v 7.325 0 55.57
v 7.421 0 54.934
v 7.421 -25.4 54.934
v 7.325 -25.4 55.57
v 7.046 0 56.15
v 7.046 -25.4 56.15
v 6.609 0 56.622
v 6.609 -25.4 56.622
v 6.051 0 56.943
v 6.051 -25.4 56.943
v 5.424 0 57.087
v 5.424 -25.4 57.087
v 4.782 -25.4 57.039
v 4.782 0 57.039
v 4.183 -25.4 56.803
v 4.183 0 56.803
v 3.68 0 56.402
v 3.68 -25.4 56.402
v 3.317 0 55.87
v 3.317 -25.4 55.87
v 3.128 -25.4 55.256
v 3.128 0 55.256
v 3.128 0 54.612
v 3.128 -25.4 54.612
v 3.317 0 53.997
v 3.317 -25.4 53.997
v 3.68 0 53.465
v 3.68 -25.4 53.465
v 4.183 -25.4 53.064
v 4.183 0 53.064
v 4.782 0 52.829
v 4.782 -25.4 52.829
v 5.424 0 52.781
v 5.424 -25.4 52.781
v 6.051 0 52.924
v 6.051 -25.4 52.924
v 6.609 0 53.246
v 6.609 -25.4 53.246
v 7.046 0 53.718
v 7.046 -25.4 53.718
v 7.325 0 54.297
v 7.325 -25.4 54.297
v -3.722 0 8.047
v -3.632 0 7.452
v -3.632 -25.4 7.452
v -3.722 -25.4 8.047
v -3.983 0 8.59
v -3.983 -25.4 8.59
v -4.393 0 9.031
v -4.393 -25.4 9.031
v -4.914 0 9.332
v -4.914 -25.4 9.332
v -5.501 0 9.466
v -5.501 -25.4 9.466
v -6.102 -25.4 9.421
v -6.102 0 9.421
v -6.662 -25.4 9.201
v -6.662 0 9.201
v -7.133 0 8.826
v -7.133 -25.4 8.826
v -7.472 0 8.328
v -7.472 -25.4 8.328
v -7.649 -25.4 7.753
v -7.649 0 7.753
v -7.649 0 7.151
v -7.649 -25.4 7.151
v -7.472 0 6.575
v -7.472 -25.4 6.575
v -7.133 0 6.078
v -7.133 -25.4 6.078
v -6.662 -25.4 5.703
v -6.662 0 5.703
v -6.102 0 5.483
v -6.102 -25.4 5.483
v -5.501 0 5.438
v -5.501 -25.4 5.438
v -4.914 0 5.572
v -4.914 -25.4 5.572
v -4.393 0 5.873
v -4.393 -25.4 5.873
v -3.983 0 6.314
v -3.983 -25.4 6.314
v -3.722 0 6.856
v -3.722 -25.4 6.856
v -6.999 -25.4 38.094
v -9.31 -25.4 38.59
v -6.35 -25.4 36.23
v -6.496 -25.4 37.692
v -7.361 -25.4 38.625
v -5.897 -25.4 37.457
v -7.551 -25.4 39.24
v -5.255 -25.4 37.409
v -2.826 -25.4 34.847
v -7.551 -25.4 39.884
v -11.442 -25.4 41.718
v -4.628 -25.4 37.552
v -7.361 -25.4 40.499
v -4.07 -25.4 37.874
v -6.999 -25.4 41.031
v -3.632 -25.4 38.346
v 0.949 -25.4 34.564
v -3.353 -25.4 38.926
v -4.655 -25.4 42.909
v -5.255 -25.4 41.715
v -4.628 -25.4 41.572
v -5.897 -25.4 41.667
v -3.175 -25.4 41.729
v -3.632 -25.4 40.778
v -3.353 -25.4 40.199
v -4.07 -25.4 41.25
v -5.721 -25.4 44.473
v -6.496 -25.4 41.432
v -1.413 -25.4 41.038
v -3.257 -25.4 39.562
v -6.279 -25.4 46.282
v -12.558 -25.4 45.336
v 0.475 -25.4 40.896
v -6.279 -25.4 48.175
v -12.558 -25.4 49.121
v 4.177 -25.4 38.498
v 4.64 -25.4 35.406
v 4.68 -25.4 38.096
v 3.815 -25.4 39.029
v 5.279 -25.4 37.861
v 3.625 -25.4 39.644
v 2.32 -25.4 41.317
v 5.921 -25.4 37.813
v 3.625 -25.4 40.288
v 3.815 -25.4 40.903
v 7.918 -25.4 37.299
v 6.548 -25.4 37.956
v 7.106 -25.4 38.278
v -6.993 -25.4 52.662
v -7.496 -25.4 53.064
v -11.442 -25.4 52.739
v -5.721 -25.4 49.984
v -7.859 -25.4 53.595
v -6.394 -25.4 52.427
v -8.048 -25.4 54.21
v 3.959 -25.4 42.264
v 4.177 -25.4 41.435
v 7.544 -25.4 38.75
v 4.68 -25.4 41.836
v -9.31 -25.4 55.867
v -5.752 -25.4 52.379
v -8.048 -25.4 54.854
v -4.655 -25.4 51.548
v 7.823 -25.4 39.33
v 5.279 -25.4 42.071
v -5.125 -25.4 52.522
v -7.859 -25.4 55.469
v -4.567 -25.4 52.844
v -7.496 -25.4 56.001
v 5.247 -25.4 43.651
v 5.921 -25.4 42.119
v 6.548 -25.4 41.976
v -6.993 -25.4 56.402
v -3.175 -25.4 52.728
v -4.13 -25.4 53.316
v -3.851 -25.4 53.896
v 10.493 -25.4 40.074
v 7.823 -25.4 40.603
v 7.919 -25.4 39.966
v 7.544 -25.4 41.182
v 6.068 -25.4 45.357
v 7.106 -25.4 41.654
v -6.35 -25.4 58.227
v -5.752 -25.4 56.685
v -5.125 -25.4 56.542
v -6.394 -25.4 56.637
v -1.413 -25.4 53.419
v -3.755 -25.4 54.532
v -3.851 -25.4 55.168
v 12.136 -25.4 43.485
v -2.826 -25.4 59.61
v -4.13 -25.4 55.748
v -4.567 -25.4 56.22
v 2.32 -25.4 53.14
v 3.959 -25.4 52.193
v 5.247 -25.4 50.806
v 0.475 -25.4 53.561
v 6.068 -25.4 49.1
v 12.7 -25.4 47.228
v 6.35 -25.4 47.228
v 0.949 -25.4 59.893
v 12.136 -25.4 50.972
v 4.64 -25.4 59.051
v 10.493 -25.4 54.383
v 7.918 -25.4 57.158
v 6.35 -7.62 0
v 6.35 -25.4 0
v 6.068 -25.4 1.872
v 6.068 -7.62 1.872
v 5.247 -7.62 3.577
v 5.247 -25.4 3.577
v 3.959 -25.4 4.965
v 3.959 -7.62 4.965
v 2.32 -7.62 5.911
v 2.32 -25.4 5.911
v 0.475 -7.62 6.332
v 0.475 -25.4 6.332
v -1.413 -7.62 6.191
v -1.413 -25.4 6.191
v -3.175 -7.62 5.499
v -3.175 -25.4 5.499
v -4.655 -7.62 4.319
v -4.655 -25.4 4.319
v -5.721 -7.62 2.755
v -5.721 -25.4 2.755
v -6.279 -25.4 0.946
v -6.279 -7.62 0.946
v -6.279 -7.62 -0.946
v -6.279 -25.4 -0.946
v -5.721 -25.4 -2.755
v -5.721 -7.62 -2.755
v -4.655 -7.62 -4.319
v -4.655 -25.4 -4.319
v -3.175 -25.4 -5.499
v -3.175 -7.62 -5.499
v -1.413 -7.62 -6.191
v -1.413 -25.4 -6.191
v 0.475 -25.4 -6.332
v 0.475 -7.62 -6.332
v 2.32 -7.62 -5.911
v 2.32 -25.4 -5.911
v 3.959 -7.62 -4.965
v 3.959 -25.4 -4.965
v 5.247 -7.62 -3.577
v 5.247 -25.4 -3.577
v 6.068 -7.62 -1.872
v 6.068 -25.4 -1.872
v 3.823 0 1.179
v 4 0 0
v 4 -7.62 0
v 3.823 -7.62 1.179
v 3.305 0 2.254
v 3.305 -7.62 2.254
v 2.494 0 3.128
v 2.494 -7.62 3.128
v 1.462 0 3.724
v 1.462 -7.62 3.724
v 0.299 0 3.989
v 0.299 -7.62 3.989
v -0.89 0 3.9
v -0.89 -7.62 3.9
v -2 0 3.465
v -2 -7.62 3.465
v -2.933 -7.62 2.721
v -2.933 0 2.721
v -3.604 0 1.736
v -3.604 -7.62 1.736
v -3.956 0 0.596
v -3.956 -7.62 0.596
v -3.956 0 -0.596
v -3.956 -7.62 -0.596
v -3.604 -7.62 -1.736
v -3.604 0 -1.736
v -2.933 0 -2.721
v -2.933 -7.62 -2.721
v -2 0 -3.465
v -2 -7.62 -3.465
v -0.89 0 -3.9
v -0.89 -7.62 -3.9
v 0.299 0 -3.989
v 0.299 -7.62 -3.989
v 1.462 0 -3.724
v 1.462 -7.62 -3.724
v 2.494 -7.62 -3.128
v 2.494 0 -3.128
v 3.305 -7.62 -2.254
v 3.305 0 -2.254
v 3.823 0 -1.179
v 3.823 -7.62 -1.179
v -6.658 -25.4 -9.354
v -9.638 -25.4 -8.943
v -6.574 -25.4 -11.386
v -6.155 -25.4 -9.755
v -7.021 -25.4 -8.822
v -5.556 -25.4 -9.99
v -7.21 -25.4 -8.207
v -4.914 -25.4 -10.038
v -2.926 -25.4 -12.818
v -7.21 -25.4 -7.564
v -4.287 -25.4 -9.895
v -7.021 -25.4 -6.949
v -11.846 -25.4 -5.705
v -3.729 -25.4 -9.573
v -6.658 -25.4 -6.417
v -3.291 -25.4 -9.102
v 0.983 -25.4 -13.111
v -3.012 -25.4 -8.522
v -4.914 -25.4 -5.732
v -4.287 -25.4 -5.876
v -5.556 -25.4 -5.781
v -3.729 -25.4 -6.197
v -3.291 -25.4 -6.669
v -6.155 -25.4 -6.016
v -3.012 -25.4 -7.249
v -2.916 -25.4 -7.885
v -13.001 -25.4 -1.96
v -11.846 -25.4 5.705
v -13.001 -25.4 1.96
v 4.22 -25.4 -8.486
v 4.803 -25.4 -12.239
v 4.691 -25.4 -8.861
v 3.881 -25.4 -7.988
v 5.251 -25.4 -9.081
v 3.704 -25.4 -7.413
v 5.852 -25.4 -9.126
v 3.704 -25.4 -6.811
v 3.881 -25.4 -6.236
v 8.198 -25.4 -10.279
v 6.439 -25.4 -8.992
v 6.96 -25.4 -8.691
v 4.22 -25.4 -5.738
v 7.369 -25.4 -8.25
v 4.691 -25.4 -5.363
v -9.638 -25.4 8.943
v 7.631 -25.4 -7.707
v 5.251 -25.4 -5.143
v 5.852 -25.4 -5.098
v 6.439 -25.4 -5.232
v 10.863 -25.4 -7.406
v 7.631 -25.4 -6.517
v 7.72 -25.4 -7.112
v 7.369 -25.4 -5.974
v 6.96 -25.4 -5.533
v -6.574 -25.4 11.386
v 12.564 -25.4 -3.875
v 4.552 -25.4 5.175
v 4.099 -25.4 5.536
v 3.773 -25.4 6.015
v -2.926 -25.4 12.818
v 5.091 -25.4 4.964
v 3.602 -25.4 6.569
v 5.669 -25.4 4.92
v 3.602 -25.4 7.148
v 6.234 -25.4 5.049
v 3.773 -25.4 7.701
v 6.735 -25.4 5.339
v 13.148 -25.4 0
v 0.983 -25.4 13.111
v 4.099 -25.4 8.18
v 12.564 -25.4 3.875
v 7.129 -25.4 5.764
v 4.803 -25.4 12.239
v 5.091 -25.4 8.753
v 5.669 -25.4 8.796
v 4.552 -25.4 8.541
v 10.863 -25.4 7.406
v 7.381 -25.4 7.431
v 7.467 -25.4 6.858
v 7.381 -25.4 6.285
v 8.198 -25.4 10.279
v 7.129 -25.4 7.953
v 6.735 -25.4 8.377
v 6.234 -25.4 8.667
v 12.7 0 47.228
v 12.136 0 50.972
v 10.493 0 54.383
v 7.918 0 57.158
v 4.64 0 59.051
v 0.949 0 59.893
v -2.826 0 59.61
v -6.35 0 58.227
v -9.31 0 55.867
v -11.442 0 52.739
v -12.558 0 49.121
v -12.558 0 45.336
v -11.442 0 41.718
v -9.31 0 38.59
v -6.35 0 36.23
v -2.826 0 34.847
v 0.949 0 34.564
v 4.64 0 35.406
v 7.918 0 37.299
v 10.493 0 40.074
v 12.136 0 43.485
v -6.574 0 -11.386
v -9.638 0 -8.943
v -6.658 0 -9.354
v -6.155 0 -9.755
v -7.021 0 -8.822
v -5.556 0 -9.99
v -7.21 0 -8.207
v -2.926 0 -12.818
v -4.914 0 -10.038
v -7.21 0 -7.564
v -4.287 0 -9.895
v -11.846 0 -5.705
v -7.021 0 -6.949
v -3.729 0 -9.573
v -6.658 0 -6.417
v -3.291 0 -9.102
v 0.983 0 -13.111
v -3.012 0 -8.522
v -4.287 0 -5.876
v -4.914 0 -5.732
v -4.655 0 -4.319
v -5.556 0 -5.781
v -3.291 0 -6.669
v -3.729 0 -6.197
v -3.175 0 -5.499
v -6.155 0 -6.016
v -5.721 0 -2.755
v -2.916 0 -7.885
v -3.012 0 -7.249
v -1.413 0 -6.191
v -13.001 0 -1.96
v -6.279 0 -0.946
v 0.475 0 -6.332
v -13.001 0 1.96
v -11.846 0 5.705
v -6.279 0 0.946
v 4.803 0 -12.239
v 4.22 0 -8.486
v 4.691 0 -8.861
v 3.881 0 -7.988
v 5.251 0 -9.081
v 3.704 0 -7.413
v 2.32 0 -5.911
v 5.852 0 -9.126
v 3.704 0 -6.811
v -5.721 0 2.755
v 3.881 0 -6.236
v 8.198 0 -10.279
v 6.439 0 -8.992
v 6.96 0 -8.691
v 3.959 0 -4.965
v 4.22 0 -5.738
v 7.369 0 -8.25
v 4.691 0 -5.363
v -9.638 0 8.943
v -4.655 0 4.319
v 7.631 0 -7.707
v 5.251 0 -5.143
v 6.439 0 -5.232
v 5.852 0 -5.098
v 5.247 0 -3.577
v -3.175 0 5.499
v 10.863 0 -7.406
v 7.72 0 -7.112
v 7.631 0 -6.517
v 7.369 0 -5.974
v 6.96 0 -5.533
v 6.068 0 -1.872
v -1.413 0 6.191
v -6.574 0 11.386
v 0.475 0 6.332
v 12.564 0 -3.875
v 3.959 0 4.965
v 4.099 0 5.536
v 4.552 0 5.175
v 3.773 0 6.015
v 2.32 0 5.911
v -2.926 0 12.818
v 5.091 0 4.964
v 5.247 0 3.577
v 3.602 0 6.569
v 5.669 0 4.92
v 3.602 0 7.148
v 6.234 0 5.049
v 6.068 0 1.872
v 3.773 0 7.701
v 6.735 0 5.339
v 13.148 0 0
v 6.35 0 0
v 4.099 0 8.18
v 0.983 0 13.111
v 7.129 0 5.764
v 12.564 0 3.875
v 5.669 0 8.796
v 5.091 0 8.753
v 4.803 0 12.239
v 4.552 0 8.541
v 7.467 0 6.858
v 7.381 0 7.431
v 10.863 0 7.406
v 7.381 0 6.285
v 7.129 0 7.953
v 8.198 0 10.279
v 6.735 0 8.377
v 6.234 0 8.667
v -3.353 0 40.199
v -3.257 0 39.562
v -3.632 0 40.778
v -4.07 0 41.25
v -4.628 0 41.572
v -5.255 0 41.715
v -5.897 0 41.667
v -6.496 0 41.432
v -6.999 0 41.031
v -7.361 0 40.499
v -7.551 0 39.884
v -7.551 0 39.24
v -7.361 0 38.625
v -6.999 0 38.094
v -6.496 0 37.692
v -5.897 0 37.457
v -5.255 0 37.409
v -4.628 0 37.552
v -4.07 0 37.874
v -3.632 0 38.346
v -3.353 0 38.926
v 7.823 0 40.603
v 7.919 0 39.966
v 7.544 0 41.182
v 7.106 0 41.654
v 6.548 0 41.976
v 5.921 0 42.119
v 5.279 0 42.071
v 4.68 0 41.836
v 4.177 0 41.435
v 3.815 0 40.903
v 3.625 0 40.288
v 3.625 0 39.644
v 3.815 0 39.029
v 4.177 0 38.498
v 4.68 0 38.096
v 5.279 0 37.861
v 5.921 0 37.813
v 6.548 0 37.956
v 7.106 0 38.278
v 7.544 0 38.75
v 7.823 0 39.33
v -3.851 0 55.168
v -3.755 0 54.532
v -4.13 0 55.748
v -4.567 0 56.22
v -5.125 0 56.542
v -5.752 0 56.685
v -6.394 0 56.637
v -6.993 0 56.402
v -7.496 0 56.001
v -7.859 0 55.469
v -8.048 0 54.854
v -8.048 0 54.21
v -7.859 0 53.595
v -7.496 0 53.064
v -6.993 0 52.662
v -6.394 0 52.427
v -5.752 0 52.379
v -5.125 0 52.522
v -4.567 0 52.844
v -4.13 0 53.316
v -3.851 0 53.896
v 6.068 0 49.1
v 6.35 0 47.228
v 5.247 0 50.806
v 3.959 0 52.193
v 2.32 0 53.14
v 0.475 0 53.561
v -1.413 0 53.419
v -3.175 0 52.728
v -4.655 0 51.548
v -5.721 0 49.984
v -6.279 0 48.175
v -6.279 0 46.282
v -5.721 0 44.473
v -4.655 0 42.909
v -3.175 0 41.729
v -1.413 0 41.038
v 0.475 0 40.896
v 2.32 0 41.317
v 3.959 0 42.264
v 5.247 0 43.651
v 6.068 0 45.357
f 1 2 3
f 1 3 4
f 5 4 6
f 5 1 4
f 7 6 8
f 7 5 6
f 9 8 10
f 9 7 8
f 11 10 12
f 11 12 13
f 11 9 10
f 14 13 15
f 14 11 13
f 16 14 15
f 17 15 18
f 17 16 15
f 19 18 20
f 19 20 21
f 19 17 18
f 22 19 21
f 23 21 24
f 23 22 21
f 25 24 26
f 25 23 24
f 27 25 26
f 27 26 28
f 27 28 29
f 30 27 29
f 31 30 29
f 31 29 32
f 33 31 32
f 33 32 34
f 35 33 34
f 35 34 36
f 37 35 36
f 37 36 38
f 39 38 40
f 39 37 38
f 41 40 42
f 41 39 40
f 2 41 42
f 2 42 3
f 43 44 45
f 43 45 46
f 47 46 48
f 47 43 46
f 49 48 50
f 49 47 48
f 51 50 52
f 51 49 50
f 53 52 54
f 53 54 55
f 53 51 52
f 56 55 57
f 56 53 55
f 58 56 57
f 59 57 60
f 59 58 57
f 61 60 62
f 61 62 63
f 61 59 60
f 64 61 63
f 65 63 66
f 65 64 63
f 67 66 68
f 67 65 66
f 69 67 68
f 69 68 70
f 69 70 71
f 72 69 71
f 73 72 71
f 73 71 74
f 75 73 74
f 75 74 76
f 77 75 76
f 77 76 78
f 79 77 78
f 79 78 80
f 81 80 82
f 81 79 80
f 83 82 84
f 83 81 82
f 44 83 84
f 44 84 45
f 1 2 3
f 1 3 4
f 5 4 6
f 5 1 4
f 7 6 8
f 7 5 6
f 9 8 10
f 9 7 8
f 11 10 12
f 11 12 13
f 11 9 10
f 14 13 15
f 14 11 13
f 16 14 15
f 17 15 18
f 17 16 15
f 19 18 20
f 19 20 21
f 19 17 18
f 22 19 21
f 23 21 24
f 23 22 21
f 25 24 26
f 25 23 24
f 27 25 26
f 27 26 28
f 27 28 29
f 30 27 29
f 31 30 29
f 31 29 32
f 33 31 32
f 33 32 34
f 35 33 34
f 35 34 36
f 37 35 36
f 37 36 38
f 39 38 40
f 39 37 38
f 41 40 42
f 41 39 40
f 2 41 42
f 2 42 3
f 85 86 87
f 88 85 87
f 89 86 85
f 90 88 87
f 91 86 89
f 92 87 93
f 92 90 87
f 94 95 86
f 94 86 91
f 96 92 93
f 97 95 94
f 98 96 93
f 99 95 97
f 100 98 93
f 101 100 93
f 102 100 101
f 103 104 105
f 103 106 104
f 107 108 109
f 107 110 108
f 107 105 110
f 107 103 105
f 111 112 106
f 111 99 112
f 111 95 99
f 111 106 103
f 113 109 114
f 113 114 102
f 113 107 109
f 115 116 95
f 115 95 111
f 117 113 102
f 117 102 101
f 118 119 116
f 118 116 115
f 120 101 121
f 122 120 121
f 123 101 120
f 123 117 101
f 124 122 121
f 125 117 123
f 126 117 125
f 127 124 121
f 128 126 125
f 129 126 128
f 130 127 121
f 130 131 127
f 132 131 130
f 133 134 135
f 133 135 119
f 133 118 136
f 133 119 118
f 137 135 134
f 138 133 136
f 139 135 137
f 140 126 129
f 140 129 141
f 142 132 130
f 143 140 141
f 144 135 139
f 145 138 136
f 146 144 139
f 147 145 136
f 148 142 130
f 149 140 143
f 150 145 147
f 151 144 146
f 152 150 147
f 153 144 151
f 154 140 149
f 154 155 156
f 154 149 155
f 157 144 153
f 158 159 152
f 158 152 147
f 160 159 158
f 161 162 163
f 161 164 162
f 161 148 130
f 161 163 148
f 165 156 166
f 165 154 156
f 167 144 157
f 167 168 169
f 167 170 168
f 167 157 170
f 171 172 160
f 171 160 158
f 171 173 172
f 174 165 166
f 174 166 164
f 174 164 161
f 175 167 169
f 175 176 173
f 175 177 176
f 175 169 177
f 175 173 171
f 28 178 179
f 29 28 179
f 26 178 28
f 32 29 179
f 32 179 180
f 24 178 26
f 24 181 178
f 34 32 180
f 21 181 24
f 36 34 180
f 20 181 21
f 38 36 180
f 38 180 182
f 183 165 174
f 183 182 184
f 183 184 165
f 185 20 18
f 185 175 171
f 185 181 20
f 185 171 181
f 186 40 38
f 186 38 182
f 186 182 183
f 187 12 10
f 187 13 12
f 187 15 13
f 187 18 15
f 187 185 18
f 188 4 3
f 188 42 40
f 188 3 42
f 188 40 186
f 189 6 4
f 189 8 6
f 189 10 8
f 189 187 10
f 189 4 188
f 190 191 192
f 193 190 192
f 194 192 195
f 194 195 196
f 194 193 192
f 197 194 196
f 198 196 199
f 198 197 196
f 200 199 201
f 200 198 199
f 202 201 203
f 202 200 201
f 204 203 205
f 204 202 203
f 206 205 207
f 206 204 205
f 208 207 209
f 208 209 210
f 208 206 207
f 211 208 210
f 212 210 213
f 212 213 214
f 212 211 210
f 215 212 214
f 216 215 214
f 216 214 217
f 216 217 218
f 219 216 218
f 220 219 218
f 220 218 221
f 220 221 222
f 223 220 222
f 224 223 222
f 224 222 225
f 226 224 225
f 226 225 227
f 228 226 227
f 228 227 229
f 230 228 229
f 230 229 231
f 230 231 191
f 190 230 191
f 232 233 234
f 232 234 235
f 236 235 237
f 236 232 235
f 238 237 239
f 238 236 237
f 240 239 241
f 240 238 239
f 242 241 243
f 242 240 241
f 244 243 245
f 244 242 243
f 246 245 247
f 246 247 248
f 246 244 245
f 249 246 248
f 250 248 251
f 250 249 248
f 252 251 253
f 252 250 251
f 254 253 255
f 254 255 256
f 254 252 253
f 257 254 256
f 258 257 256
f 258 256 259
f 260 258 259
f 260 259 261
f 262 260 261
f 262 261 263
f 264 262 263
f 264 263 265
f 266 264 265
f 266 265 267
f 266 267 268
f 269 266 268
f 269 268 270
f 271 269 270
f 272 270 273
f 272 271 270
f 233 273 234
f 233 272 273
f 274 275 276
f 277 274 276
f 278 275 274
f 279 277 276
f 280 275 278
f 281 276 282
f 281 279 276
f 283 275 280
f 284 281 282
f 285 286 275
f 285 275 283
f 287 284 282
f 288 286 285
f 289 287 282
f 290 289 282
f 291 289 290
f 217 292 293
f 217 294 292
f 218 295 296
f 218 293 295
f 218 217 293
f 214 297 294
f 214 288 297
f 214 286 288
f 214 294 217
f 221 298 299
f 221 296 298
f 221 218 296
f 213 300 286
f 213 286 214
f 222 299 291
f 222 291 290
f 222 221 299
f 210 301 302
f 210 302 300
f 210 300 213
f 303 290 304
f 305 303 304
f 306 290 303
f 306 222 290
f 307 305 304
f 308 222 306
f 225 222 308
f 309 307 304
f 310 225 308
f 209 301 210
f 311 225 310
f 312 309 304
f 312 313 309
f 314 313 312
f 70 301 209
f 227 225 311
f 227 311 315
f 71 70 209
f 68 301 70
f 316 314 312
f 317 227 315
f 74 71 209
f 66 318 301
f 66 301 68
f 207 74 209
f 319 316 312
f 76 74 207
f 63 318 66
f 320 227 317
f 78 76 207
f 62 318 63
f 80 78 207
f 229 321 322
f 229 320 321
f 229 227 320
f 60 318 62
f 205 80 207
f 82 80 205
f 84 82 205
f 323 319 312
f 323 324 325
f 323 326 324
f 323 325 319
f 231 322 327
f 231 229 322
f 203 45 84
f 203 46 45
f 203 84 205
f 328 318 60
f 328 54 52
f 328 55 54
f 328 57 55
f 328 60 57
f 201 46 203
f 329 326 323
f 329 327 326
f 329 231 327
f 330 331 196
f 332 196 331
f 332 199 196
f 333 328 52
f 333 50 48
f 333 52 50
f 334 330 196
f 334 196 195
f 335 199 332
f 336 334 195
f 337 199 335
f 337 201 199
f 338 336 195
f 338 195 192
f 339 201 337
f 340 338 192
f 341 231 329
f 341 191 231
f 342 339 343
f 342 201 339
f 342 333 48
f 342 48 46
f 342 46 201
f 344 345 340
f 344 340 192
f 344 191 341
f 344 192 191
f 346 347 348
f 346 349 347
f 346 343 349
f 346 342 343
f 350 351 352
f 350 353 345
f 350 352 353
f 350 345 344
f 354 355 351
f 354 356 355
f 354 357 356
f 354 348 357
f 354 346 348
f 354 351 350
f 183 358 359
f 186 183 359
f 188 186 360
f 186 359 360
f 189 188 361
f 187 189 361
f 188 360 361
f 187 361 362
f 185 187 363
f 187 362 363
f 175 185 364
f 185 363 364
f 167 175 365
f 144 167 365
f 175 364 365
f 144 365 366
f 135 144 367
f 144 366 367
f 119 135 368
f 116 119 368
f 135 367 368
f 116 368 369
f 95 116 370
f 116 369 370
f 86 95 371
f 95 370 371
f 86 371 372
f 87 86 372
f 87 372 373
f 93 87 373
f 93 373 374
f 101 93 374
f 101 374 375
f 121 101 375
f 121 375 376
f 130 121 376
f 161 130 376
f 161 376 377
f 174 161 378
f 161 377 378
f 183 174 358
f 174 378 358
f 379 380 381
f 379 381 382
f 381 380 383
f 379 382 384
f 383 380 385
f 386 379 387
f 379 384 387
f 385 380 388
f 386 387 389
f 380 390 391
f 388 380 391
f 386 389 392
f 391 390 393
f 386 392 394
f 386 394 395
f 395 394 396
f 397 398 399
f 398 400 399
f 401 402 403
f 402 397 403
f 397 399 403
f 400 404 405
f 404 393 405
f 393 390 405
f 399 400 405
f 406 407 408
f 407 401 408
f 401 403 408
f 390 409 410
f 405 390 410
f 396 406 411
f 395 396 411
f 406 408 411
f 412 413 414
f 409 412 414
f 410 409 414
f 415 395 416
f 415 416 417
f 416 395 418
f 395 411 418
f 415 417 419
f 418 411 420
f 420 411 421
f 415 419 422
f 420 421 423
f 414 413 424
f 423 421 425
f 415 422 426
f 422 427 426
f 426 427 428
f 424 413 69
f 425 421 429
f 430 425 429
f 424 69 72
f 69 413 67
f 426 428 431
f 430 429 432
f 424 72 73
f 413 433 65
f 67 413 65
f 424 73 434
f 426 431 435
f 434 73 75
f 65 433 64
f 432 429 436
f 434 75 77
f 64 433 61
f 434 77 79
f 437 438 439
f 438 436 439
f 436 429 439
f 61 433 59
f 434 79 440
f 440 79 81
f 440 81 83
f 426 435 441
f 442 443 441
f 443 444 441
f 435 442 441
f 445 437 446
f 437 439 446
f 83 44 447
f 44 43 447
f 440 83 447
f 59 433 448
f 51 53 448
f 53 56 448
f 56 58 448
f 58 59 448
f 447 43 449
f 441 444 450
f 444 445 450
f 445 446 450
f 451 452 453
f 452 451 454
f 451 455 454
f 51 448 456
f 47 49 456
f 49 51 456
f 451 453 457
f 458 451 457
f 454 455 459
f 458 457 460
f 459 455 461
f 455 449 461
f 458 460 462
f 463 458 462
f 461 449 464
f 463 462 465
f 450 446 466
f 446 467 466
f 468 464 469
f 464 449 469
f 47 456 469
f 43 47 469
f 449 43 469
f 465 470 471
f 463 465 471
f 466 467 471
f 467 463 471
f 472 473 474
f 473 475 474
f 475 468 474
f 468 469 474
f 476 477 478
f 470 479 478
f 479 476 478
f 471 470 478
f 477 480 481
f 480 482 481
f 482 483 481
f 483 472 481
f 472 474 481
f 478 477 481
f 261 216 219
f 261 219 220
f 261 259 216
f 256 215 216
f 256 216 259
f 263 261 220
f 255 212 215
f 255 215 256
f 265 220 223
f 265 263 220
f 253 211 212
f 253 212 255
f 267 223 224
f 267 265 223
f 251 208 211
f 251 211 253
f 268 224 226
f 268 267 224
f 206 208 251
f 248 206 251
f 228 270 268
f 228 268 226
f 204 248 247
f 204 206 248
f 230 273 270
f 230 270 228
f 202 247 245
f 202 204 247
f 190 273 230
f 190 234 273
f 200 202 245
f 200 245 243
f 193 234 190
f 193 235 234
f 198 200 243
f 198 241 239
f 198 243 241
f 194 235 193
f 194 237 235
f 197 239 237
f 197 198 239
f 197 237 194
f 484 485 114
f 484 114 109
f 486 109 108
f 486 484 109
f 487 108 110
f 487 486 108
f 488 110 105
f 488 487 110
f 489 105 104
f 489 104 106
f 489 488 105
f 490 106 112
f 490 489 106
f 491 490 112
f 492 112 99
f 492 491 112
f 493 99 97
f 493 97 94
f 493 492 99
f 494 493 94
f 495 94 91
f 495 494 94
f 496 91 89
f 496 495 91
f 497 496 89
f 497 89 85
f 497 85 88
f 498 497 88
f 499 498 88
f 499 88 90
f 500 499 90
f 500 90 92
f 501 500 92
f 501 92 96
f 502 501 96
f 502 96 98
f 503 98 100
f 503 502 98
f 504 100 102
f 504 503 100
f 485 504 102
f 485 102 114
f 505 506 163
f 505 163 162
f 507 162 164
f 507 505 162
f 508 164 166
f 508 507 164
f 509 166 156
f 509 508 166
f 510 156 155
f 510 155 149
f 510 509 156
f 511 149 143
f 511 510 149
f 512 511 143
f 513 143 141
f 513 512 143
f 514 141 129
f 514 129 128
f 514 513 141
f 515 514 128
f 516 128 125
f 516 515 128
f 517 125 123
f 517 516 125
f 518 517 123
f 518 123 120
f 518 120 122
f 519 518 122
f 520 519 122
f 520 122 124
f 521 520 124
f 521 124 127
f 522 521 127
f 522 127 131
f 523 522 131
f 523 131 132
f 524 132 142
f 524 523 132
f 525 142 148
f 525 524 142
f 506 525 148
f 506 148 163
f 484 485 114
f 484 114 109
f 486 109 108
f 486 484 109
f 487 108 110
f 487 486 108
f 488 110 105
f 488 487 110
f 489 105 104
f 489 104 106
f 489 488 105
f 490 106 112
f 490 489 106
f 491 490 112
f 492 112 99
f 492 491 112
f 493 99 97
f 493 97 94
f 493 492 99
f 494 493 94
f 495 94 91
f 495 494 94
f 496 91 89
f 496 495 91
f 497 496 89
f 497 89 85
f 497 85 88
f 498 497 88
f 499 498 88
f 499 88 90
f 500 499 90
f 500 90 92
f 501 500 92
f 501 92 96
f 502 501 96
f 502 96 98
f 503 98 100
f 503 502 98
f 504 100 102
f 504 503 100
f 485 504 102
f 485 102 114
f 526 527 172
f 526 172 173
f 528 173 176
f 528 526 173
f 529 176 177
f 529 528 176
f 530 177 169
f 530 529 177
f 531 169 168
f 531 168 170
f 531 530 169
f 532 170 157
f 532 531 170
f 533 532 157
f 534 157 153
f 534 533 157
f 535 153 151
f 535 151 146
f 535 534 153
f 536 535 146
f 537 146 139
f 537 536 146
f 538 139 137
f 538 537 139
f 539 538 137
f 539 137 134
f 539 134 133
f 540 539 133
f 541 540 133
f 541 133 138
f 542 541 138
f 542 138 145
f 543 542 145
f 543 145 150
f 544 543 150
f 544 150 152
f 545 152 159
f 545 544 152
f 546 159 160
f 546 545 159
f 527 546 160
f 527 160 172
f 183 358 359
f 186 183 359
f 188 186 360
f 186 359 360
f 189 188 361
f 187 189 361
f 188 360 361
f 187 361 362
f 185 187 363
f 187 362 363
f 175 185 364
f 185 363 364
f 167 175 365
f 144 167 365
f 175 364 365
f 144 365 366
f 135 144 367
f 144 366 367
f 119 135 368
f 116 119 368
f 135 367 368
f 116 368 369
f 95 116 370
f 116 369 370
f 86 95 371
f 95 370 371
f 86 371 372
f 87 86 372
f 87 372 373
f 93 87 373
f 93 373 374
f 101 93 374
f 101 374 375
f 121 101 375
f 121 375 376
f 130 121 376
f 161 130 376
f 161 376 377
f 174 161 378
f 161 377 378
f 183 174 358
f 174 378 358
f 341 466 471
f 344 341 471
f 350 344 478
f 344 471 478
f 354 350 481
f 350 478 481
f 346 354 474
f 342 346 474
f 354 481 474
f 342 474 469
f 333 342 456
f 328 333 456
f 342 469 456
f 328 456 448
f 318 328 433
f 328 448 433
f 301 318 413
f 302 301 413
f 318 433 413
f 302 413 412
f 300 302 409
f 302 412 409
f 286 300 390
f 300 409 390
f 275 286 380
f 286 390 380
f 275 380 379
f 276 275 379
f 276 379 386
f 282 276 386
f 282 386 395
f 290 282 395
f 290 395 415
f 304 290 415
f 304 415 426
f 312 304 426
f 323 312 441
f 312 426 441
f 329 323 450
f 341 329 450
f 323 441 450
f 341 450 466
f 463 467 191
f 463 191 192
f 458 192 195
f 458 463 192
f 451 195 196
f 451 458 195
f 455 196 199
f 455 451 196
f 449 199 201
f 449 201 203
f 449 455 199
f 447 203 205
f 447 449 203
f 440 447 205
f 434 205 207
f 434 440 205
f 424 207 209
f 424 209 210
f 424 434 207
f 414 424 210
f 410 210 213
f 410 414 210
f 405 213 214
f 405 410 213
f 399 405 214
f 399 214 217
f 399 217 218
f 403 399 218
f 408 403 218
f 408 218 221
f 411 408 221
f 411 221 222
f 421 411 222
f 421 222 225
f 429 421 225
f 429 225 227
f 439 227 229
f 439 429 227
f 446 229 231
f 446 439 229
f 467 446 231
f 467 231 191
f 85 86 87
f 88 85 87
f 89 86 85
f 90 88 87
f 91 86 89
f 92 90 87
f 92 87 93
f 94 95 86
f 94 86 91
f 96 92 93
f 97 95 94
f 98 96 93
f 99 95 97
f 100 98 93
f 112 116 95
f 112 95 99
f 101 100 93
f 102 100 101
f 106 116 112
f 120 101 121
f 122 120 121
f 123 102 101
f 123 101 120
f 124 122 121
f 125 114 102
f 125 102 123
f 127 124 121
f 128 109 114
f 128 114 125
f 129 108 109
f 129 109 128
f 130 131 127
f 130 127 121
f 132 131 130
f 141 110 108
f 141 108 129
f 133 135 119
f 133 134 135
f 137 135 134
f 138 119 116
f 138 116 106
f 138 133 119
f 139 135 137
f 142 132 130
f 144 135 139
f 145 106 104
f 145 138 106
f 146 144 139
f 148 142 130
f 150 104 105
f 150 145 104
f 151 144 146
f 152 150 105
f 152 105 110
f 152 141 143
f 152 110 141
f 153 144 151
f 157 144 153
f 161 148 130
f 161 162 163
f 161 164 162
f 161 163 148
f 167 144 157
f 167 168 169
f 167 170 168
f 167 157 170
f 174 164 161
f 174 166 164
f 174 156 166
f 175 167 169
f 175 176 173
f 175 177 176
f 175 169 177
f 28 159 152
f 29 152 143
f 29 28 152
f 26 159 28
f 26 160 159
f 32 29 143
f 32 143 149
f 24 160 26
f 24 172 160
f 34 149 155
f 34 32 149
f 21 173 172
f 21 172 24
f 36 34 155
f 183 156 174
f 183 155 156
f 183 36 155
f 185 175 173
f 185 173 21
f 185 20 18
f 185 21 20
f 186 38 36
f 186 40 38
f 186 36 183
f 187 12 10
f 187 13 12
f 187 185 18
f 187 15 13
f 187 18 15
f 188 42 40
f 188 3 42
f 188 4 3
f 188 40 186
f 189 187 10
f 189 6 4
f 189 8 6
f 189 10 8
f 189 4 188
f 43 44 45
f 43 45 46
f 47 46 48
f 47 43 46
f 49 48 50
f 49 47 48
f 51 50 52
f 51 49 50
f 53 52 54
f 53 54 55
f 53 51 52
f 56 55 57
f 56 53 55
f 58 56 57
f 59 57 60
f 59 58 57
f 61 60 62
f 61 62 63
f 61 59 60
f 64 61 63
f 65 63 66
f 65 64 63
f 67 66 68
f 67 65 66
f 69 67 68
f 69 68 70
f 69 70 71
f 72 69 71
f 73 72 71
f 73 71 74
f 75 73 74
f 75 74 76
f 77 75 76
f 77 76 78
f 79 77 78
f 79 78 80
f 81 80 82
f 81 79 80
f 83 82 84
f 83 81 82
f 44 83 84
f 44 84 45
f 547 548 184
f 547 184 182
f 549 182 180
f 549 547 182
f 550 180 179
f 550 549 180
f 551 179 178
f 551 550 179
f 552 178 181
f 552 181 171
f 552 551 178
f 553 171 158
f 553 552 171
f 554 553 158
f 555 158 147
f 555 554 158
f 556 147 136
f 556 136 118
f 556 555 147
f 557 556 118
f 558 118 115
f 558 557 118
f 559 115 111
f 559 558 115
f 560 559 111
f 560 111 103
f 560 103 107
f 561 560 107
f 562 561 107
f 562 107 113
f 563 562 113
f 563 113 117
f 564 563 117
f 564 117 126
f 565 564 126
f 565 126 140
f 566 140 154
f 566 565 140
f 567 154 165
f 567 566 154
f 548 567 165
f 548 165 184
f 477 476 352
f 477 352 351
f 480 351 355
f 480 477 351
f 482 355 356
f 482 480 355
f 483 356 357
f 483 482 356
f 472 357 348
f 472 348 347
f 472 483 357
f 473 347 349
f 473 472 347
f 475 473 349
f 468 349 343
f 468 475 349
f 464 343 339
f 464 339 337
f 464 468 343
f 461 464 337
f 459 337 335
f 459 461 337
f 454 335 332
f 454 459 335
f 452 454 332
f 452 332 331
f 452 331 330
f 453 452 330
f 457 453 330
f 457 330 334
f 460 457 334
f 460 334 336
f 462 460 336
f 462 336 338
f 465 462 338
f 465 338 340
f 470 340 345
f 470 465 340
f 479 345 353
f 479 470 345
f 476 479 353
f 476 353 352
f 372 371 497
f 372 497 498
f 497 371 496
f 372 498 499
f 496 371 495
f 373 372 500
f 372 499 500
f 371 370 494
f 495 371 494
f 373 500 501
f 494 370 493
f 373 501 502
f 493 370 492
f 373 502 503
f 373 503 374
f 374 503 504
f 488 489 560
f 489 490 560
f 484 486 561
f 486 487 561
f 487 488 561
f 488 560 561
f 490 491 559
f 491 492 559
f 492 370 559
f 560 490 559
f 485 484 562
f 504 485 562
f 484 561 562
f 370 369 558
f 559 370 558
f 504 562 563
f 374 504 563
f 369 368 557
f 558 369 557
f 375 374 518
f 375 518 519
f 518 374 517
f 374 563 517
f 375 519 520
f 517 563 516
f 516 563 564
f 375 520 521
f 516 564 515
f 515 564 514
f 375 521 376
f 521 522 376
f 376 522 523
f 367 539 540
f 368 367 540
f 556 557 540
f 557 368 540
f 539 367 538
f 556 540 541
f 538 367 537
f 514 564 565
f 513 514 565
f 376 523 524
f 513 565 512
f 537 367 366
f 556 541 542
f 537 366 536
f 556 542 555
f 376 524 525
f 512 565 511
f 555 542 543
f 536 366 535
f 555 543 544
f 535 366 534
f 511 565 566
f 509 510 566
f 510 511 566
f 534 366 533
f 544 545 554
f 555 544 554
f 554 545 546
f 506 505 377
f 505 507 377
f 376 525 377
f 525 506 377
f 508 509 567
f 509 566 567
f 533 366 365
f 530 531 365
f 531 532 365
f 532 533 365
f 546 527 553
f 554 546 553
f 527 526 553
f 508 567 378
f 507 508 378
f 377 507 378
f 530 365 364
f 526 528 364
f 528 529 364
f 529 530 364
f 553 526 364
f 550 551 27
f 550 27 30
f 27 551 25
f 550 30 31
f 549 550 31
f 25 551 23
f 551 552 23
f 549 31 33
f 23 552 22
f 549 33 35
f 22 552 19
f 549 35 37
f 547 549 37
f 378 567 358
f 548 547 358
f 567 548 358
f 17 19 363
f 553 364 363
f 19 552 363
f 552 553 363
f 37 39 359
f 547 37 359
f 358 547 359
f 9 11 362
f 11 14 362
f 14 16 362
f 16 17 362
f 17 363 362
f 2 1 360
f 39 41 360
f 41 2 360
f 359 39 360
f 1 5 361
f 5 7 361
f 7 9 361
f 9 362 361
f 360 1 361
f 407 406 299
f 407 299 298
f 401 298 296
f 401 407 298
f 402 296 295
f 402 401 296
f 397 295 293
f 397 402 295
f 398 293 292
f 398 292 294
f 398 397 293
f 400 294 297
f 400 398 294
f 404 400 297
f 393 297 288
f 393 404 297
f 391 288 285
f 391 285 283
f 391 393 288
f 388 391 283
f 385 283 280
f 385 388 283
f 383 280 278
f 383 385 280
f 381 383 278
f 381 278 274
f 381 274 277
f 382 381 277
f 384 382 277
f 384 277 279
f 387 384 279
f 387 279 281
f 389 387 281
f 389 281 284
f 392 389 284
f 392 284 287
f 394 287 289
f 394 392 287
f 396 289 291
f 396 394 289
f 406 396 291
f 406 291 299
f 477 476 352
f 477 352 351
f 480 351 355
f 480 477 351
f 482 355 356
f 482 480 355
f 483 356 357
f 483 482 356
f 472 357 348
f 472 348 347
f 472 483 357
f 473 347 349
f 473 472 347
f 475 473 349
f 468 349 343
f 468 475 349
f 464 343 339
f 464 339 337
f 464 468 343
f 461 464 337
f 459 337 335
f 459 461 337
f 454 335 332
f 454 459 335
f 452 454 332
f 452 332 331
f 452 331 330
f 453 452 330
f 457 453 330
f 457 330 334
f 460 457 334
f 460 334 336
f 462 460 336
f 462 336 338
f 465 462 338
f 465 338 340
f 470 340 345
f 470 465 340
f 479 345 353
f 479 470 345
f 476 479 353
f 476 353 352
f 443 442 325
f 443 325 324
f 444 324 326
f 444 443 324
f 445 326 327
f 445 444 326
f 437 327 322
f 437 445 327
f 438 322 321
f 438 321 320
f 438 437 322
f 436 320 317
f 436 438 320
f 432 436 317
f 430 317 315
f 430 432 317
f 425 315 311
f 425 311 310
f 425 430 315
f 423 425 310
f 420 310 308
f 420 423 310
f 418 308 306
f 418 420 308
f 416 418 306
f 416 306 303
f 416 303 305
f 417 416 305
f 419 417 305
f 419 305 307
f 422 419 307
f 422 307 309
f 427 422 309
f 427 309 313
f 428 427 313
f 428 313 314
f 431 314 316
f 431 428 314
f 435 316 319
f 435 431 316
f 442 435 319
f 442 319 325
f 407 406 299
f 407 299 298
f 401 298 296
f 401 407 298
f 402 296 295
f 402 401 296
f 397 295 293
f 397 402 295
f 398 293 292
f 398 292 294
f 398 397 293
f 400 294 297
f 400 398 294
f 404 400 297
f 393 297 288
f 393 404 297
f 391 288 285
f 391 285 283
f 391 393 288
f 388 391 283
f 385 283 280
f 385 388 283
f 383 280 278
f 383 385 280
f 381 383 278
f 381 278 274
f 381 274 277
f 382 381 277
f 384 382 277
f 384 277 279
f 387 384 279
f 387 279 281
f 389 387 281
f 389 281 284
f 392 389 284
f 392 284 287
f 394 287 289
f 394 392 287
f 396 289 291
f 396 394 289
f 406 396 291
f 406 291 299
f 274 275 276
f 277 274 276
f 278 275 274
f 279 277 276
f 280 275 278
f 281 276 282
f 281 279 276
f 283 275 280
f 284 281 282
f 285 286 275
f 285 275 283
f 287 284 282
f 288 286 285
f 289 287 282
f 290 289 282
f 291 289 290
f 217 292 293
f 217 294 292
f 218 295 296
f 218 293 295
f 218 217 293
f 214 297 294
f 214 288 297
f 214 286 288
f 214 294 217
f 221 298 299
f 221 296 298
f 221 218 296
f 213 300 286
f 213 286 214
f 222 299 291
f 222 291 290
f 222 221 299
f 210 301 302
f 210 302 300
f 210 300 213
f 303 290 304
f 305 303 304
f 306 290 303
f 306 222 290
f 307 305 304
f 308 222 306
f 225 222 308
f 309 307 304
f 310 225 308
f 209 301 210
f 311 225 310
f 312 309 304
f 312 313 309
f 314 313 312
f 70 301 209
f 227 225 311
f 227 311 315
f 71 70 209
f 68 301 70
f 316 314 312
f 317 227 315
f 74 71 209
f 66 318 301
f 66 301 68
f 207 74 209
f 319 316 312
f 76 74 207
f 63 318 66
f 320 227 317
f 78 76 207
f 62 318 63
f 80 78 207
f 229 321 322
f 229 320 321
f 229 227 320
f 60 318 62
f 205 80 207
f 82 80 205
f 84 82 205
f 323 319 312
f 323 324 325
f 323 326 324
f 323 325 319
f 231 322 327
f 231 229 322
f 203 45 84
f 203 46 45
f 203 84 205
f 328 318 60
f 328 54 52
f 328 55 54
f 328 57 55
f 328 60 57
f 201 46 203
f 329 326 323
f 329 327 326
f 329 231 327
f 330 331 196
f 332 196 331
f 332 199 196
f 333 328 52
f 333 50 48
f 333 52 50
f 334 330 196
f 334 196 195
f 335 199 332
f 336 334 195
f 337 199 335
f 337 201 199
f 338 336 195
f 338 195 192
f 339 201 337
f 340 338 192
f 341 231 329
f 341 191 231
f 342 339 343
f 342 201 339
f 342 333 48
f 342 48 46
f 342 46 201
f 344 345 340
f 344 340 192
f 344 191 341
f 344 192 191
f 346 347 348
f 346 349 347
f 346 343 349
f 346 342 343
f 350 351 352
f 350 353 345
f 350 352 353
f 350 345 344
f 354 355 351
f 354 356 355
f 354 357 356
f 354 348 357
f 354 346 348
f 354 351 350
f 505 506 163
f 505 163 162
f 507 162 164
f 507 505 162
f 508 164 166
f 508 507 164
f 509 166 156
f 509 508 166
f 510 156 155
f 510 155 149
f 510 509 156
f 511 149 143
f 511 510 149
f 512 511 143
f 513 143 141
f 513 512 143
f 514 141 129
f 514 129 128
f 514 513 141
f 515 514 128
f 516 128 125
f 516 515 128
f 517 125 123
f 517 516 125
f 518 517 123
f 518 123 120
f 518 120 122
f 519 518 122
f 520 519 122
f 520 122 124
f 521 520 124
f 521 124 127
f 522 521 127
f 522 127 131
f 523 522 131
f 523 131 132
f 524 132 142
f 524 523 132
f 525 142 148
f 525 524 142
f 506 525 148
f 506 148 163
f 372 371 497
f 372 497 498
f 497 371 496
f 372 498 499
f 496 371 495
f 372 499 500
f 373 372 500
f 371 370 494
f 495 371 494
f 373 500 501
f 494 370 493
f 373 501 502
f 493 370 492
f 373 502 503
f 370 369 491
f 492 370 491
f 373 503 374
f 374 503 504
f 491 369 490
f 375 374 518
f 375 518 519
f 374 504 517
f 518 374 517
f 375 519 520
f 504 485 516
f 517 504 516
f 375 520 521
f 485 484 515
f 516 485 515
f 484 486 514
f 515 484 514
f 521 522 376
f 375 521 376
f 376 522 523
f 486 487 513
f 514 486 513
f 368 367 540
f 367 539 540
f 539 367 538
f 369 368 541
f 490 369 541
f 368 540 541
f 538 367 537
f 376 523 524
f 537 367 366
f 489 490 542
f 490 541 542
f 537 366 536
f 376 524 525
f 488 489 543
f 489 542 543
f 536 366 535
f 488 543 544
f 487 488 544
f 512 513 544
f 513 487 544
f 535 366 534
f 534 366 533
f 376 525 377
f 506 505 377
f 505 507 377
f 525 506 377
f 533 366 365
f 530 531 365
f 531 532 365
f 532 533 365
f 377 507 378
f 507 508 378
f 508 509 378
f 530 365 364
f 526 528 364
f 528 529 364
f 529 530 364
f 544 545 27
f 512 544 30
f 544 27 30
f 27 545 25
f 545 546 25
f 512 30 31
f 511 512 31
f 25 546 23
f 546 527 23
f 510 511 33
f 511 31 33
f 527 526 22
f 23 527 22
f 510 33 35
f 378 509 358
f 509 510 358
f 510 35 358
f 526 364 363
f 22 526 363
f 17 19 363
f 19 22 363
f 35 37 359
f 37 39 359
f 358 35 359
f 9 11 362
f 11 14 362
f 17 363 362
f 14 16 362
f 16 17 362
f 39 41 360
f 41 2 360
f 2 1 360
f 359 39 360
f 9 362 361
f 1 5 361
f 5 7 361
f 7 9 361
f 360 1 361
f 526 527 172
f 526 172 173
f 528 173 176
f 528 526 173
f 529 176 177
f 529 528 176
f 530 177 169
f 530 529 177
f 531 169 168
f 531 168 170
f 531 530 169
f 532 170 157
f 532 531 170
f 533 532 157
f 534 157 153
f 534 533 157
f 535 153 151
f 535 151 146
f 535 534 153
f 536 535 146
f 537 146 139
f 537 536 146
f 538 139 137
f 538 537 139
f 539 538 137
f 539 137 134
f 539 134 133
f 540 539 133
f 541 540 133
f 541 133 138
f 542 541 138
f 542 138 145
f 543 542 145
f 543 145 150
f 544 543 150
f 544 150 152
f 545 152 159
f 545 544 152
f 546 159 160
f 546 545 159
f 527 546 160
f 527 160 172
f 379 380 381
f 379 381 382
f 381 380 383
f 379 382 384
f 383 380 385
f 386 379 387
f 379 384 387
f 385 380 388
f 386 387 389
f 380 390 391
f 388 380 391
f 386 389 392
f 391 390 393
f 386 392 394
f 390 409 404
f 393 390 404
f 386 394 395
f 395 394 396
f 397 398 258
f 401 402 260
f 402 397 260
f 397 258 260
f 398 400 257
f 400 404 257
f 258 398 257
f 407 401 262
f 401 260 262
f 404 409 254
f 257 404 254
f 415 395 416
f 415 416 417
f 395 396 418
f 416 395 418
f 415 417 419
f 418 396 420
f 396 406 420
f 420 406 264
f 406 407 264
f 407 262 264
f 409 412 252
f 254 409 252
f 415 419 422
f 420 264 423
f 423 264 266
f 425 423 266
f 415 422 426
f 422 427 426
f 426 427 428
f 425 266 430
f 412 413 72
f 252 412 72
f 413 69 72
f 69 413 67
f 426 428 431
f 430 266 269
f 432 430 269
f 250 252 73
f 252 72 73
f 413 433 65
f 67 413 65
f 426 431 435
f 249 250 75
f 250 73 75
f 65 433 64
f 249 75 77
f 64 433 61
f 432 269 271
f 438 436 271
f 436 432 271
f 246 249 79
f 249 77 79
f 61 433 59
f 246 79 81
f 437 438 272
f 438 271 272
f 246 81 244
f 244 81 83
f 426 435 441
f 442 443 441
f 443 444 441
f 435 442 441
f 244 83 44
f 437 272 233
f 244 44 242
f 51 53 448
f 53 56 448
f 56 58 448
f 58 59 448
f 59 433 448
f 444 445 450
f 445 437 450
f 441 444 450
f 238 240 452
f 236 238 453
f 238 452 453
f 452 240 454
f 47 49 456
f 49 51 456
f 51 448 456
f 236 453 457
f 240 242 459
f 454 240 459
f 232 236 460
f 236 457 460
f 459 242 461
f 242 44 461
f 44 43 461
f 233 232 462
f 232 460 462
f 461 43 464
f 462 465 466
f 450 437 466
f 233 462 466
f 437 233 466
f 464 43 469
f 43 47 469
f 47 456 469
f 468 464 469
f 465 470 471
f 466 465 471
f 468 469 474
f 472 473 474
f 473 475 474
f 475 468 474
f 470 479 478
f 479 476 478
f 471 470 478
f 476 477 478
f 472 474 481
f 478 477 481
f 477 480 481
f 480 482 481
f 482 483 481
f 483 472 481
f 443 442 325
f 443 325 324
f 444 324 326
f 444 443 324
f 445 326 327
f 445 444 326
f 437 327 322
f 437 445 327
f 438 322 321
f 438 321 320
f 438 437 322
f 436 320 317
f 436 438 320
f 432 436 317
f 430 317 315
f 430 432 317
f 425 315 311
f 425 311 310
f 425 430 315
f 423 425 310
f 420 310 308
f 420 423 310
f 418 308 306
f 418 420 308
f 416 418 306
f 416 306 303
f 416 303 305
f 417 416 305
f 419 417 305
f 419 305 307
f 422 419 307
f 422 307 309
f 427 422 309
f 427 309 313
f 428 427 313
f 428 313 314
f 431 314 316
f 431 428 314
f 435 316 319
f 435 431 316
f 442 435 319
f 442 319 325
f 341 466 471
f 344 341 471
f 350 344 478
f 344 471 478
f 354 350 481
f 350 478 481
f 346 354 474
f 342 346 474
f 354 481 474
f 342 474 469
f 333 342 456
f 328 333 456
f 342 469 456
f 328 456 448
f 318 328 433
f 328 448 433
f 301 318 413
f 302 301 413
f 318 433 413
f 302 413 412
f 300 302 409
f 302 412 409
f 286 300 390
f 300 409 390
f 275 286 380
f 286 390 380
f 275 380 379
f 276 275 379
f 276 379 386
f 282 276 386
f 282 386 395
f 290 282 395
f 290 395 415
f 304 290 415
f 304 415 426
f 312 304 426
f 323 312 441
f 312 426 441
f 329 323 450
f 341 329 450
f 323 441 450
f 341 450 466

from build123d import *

# Parameters (mm, degrees)
F0_R     = 6.35
F0_R_2   = 4.0005
F1_DEPTH = 7.62
F0_R_3   = 13.147852
F0_R_4   = 2.159
F0_R_5   = 2.019739
F0_R_6   = 1.943232
F2_DEPTH = 25.4
F0_R_7   = 12.7
F3_DEPTH = 25.4
F4_DEPTH = 25.4


with BuildPart() as f1:
    # F0 (on Front) → F1 (new body)
    with BuildSketch(Plane.XZ):
        Circle(F0_R)
        Circle(F0_R_2, mode=Mode.SUBTRACT)
    extrude(amount=F1_DEPTH)

    # F0 (on Front) → F2 (join)
    with BuildSketch(Plane.XZ):
        Circle(F0_R_3)
        with Locations((-5.075337, -7.885403)):
            Circle(F0_R_4, mode=Mode.SUBTRACT)
        with Locations((-5.652183, 7.45177)):
            Circle(F0_R_5, mode=Mode.SUBTRACT)
        with Locations((5.700697, -7.111833)):
            Circle(F0_R_5, mode=Mode.SUBTRACT)
        Circle(F0_R, mode=Mode.SUBTRACT)
        with Locations((5.523817, 6.858167)):
            Circle(F0_R_6, mode=Mode.SUBTRACT)
    extrude(amount=F2_DEPTH)

    # F0 (on Front) → F3 (join)
    with BuildSketch(Plane.XZ):
        Circle(F0_R_3)
        with Locations((-5.075337, -7.885403)):
            Circle(F0_R_4, mode=Mode.SUBTRACT)
        with Locations((-5.652183, 7.45177)):
            Circle(F0_R_5, mode=Mode.SUBTRACT)
        with Locations((5.700697, -7.111833)):
            Circle(F0_R_5, mode=Mode.SUBTRACT)
        Circle(F0_R, mode=Mode.SUBTRACT)
        with Locations((5.523817, 6.858167)):
            Circle(F0_R_6, mode=Mode.SUBTRACT)
        with Locations((0, 47.228459)):
            Circle(F0_R_7)
        with Locations((-5.416306, 39.562173)):
            Circle(F0_R_4, mode=Mode.SUBTRACT)
        with Locations((-5.913603, 54.532107)):
            Circle(F0_R_4, mode=Mode.SUBTRACT)
        with Locations((5.759694, 39.966151)):
            Circle(F0_R_4, mode=Mode.SUBTRACT)
        with Locations((0, 47.228459)):
            Circle(F0_R, mode=Mode.SUBTRACT)
        with Locations((5.262397, 54.933734)):
            Circle(F0_R_4, mode=Mode.SUBTRACT)
    extrude(amount=F3_DEPTH)


with BuildPart() as f4:
    # F0 (on Front) → F4 (new body)
    with BuildSketch(Plane.XZ):
        Circle(F0_R_3)
        with Locations((-5.075337, -7.885403)):
            Circle(F0_R_4, mode=Mode.SUBTRACT)
        with Locations((-5.652183, 7.45177)):
            Circle(F0_R_5, mode=Mode.SUBTRACT)
        with Locations((5.700697, -7.111833)):
            Circle(F0_R_5, mode=Mode.SUBTRACT)
        Circle(F0_R, mode=Mode.SUBTRACT)
        with Locations((5.523817, 6.858167)):
            Circle(F0_R_6, mode=Mode.SUBTRACT)
        with Locations((0, 47.228459)):
            Circle(F0_R_7)
        with Locations((-5.416306, 39.562173)):
            Circle(F0_R_4, mode=Mode.SUBTRACT)
        with Locations((-5.913603, 54.532107)):
            Circle(F0_R_4, mode=Mode.SUBTRACT)
        with Locations((5.759694, 39.966151)):
            Circle(F0_R_4, mode=Mode.SUBTRACT)
        with Locations((0, 47.228459)):
            Circle(F0_R, mode=Mode.SUBTRACT)
        with Locations((5.262397, 54.933734)):
            Circle(F0_R_4, mode=Mode.SUBTRACT)
        with Locations((0, 47.228459)):
            Circle(F0_R)
        with Locations((0, 47.228459)):
            Circle(F0_R_2, mode=Mode.SUBTRACT)
        with Locations((0, 47.228459)):
            Circle(F0_R_2)
    extrude(amount=F4_DEPTH)


solid = Compound([f1.part, f4.part])
